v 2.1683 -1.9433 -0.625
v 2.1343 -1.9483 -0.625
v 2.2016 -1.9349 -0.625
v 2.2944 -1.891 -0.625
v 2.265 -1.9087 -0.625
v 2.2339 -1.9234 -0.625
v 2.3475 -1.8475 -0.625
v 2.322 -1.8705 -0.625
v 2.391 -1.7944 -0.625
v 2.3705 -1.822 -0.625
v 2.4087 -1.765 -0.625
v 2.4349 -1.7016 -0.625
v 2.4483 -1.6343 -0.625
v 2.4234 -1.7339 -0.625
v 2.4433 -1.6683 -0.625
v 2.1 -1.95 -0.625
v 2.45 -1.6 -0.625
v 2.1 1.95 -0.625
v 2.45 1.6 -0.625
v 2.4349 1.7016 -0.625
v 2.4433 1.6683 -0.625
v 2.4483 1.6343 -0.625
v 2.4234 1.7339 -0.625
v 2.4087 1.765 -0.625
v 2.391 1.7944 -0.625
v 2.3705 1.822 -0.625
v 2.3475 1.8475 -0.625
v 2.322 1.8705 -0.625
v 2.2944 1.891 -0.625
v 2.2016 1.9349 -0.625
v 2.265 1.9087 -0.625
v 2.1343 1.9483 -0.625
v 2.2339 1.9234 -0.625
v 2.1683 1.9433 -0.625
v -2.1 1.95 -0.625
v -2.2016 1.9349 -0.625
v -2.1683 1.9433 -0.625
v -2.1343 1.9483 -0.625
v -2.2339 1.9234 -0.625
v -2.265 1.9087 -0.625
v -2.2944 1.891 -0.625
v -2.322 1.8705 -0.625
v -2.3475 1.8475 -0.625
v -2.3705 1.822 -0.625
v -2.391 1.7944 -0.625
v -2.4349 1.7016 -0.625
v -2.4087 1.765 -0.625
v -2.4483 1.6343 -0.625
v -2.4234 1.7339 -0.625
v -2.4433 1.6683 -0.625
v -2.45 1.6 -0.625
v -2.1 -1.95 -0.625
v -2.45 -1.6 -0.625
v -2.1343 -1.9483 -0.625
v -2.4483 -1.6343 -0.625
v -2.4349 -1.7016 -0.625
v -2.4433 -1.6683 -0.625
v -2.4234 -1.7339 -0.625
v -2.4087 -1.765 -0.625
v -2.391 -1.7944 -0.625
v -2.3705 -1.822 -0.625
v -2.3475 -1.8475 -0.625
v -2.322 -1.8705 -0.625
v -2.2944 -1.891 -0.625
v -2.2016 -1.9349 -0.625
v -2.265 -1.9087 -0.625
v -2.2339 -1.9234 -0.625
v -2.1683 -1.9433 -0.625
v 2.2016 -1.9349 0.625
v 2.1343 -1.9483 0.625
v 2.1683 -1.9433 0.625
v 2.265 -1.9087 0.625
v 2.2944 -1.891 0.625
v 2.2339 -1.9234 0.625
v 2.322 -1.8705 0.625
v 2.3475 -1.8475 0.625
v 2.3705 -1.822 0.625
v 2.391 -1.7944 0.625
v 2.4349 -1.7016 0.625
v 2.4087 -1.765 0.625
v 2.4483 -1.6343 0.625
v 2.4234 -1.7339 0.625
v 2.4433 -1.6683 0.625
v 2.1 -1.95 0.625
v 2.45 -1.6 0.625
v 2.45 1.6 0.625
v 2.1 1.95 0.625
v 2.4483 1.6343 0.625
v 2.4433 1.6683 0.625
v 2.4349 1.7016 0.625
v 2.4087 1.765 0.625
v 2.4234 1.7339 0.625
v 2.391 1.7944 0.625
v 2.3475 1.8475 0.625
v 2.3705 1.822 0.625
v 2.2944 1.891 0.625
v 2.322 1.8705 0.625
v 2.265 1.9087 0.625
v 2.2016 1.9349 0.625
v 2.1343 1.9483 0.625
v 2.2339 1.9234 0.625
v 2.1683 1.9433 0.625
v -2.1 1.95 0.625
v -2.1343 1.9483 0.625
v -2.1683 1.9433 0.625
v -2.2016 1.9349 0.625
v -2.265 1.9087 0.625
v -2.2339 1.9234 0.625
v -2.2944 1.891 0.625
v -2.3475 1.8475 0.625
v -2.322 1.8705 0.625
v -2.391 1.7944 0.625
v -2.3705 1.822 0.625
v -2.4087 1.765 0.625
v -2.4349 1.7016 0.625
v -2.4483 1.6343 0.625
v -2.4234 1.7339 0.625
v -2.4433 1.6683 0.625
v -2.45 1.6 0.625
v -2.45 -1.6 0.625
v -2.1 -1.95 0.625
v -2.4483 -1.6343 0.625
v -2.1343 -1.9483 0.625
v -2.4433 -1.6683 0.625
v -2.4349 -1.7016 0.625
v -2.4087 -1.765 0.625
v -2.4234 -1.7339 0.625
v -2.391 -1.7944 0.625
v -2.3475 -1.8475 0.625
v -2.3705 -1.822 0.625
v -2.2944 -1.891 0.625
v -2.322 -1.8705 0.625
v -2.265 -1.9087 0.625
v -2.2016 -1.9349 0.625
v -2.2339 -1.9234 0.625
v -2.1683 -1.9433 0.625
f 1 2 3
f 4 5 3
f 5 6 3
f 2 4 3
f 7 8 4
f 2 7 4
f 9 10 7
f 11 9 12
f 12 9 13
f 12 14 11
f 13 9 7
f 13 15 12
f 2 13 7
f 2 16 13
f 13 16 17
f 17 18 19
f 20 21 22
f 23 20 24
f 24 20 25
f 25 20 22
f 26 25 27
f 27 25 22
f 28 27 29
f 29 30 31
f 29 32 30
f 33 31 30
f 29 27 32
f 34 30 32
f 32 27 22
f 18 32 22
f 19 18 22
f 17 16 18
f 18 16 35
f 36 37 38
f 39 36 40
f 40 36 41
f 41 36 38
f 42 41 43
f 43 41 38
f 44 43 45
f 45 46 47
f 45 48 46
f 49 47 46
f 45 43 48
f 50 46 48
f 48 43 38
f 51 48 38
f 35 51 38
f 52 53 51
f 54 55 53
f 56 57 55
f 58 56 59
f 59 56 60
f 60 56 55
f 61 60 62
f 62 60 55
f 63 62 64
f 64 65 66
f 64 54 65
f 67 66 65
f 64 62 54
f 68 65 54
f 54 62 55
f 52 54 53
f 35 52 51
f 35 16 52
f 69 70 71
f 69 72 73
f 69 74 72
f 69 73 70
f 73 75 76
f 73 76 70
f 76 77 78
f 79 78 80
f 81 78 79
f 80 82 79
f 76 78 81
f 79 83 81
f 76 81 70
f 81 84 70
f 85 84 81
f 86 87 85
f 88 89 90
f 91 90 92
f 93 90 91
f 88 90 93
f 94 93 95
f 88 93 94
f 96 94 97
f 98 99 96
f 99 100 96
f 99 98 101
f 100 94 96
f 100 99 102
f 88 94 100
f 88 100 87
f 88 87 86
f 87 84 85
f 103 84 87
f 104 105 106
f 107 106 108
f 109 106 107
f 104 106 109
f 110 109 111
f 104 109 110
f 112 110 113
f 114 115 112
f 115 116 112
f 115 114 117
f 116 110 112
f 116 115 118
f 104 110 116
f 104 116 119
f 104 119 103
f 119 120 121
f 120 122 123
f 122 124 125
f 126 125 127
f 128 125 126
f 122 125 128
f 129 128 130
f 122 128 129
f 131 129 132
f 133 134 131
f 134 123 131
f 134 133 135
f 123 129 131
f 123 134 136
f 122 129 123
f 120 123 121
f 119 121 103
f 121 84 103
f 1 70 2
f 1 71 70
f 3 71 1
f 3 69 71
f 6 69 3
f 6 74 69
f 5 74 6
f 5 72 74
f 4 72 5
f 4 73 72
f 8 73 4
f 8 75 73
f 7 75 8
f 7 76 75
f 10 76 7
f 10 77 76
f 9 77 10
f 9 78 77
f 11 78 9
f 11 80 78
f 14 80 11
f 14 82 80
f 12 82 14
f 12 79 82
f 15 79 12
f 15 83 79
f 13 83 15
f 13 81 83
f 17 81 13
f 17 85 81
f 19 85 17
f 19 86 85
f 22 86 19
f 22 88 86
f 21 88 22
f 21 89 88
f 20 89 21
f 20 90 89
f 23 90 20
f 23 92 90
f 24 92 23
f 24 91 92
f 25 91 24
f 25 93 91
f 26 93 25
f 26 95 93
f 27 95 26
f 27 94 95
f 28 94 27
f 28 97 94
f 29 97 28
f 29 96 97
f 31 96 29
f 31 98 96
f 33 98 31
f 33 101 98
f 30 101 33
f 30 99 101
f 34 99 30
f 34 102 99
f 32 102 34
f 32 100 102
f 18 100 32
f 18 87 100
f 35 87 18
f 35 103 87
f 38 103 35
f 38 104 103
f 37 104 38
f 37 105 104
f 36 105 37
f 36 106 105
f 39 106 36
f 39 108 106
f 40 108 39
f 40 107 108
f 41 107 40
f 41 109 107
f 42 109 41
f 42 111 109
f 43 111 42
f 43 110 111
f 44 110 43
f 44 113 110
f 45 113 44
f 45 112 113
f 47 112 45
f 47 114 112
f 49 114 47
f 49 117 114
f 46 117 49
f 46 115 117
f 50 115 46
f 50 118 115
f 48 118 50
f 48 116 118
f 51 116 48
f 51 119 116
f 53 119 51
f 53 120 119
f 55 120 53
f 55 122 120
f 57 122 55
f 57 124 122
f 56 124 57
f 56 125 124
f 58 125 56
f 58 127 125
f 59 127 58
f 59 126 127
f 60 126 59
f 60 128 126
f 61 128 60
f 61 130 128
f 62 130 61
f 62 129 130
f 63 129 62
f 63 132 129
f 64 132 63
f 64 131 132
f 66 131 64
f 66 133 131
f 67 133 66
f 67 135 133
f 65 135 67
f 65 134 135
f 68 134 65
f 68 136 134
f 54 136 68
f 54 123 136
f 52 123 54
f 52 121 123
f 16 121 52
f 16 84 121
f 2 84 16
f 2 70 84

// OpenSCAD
$fn=64;

module smd_body(size=[4.90, 3.90, 1.25], corner_r=0.35) {
    x=size[0]; y=size[1]; z=size[2];
    r=min(corner_r, x/2, y/2);
    linear_extrude(height=z, center=true)
        offset(r=r)
            square([x-2*r, y-2*r], center=true);
}

smd_body([4.90, 3.90, 1.25], 0.35);
